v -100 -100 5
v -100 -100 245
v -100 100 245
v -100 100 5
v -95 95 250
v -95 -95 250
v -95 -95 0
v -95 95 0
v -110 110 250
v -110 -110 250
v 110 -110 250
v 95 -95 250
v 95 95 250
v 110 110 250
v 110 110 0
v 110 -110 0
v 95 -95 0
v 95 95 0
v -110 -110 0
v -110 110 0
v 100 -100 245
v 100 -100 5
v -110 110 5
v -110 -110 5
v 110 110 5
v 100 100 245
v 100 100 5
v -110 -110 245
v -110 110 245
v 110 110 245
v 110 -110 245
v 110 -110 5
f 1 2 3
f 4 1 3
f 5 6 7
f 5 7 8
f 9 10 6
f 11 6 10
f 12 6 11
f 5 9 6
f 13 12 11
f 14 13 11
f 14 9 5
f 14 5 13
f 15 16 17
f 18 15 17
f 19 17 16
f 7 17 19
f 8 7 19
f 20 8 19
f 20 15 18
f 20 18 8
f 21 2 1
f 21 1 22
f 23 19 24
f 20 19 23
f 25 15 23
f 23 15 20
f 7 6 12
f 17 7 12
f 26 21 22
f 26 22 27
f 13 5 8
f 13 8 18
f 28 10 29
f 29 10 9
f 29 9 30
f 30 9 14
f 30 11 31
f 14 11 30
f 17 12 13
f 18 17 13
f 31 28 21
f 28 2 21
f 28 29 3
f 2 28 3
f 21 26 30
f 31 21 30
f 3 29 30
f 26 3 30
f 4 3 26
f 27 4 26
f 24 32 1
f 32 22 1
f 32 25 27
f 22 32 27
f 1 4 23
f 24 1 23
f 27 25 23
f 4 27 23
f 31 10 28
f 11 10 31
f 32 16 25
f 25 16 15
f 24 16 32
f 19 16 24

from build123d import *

# Parameters (mm, degrees)
SKETCH1_W           = 200
SKETCH1_H           = 200
BOSS_EXTRUDE1_DEPTH = 250
SKETCH2_W           = 220
SKETCH2_H           = 220
BOSS_EXTRUDE3_DEPTH = 5
SKETCH3_W           = 220
SKETCH3_H           = 220
BOSS_EXTRUDE4_DEPTH = 5
SKETCH4_W           = 190
SKETCH4_H           = 190
CUT_EXTRUDE1_DEPTH  = 251


with BuildPart() as part:
    # Sketch1 → Boss-Extrude1 (new body)
    with BuildSketch(Plane.XY):
        Rectangle(SKETCH1_W, SKETCH1_H)
    extrude(amount=BOSS_EXTRUDE1_DEPTH)

    # Sketch2 → Boss-Extrude3 (add)
    with BuildSketch(Plane.XY.offset(250)):
        Rectangle(SKETCH2_W, SKETCH2_H)
    extrude(amount=-BOSS_EXTRUDE3_DEPTH)

    # Sketch3 → Boss-Extrude4 (add)
    with BuildSketch(Plane(origin=(0, 0, 0), x_dir=(-1, 0, 0), z_dir=(0, 0, -1))):
        Rectangle(SKETCH3_W, SKETCH3_H)
    extrude(amount=-BOSS_EXTRUDE4_DEPTH)

    # Sketch4 → Cut-Extrude1 (cut, through all)
    with BuildSketch(Plane.XY.offset(250)):
        Rectangle(SKETCH4_W, SKETCH4_H)
    extrude(amount=-CUT_EXTRUDE1_DEPTH, mode=Mode.SUBTRACT)


solid = part.part
